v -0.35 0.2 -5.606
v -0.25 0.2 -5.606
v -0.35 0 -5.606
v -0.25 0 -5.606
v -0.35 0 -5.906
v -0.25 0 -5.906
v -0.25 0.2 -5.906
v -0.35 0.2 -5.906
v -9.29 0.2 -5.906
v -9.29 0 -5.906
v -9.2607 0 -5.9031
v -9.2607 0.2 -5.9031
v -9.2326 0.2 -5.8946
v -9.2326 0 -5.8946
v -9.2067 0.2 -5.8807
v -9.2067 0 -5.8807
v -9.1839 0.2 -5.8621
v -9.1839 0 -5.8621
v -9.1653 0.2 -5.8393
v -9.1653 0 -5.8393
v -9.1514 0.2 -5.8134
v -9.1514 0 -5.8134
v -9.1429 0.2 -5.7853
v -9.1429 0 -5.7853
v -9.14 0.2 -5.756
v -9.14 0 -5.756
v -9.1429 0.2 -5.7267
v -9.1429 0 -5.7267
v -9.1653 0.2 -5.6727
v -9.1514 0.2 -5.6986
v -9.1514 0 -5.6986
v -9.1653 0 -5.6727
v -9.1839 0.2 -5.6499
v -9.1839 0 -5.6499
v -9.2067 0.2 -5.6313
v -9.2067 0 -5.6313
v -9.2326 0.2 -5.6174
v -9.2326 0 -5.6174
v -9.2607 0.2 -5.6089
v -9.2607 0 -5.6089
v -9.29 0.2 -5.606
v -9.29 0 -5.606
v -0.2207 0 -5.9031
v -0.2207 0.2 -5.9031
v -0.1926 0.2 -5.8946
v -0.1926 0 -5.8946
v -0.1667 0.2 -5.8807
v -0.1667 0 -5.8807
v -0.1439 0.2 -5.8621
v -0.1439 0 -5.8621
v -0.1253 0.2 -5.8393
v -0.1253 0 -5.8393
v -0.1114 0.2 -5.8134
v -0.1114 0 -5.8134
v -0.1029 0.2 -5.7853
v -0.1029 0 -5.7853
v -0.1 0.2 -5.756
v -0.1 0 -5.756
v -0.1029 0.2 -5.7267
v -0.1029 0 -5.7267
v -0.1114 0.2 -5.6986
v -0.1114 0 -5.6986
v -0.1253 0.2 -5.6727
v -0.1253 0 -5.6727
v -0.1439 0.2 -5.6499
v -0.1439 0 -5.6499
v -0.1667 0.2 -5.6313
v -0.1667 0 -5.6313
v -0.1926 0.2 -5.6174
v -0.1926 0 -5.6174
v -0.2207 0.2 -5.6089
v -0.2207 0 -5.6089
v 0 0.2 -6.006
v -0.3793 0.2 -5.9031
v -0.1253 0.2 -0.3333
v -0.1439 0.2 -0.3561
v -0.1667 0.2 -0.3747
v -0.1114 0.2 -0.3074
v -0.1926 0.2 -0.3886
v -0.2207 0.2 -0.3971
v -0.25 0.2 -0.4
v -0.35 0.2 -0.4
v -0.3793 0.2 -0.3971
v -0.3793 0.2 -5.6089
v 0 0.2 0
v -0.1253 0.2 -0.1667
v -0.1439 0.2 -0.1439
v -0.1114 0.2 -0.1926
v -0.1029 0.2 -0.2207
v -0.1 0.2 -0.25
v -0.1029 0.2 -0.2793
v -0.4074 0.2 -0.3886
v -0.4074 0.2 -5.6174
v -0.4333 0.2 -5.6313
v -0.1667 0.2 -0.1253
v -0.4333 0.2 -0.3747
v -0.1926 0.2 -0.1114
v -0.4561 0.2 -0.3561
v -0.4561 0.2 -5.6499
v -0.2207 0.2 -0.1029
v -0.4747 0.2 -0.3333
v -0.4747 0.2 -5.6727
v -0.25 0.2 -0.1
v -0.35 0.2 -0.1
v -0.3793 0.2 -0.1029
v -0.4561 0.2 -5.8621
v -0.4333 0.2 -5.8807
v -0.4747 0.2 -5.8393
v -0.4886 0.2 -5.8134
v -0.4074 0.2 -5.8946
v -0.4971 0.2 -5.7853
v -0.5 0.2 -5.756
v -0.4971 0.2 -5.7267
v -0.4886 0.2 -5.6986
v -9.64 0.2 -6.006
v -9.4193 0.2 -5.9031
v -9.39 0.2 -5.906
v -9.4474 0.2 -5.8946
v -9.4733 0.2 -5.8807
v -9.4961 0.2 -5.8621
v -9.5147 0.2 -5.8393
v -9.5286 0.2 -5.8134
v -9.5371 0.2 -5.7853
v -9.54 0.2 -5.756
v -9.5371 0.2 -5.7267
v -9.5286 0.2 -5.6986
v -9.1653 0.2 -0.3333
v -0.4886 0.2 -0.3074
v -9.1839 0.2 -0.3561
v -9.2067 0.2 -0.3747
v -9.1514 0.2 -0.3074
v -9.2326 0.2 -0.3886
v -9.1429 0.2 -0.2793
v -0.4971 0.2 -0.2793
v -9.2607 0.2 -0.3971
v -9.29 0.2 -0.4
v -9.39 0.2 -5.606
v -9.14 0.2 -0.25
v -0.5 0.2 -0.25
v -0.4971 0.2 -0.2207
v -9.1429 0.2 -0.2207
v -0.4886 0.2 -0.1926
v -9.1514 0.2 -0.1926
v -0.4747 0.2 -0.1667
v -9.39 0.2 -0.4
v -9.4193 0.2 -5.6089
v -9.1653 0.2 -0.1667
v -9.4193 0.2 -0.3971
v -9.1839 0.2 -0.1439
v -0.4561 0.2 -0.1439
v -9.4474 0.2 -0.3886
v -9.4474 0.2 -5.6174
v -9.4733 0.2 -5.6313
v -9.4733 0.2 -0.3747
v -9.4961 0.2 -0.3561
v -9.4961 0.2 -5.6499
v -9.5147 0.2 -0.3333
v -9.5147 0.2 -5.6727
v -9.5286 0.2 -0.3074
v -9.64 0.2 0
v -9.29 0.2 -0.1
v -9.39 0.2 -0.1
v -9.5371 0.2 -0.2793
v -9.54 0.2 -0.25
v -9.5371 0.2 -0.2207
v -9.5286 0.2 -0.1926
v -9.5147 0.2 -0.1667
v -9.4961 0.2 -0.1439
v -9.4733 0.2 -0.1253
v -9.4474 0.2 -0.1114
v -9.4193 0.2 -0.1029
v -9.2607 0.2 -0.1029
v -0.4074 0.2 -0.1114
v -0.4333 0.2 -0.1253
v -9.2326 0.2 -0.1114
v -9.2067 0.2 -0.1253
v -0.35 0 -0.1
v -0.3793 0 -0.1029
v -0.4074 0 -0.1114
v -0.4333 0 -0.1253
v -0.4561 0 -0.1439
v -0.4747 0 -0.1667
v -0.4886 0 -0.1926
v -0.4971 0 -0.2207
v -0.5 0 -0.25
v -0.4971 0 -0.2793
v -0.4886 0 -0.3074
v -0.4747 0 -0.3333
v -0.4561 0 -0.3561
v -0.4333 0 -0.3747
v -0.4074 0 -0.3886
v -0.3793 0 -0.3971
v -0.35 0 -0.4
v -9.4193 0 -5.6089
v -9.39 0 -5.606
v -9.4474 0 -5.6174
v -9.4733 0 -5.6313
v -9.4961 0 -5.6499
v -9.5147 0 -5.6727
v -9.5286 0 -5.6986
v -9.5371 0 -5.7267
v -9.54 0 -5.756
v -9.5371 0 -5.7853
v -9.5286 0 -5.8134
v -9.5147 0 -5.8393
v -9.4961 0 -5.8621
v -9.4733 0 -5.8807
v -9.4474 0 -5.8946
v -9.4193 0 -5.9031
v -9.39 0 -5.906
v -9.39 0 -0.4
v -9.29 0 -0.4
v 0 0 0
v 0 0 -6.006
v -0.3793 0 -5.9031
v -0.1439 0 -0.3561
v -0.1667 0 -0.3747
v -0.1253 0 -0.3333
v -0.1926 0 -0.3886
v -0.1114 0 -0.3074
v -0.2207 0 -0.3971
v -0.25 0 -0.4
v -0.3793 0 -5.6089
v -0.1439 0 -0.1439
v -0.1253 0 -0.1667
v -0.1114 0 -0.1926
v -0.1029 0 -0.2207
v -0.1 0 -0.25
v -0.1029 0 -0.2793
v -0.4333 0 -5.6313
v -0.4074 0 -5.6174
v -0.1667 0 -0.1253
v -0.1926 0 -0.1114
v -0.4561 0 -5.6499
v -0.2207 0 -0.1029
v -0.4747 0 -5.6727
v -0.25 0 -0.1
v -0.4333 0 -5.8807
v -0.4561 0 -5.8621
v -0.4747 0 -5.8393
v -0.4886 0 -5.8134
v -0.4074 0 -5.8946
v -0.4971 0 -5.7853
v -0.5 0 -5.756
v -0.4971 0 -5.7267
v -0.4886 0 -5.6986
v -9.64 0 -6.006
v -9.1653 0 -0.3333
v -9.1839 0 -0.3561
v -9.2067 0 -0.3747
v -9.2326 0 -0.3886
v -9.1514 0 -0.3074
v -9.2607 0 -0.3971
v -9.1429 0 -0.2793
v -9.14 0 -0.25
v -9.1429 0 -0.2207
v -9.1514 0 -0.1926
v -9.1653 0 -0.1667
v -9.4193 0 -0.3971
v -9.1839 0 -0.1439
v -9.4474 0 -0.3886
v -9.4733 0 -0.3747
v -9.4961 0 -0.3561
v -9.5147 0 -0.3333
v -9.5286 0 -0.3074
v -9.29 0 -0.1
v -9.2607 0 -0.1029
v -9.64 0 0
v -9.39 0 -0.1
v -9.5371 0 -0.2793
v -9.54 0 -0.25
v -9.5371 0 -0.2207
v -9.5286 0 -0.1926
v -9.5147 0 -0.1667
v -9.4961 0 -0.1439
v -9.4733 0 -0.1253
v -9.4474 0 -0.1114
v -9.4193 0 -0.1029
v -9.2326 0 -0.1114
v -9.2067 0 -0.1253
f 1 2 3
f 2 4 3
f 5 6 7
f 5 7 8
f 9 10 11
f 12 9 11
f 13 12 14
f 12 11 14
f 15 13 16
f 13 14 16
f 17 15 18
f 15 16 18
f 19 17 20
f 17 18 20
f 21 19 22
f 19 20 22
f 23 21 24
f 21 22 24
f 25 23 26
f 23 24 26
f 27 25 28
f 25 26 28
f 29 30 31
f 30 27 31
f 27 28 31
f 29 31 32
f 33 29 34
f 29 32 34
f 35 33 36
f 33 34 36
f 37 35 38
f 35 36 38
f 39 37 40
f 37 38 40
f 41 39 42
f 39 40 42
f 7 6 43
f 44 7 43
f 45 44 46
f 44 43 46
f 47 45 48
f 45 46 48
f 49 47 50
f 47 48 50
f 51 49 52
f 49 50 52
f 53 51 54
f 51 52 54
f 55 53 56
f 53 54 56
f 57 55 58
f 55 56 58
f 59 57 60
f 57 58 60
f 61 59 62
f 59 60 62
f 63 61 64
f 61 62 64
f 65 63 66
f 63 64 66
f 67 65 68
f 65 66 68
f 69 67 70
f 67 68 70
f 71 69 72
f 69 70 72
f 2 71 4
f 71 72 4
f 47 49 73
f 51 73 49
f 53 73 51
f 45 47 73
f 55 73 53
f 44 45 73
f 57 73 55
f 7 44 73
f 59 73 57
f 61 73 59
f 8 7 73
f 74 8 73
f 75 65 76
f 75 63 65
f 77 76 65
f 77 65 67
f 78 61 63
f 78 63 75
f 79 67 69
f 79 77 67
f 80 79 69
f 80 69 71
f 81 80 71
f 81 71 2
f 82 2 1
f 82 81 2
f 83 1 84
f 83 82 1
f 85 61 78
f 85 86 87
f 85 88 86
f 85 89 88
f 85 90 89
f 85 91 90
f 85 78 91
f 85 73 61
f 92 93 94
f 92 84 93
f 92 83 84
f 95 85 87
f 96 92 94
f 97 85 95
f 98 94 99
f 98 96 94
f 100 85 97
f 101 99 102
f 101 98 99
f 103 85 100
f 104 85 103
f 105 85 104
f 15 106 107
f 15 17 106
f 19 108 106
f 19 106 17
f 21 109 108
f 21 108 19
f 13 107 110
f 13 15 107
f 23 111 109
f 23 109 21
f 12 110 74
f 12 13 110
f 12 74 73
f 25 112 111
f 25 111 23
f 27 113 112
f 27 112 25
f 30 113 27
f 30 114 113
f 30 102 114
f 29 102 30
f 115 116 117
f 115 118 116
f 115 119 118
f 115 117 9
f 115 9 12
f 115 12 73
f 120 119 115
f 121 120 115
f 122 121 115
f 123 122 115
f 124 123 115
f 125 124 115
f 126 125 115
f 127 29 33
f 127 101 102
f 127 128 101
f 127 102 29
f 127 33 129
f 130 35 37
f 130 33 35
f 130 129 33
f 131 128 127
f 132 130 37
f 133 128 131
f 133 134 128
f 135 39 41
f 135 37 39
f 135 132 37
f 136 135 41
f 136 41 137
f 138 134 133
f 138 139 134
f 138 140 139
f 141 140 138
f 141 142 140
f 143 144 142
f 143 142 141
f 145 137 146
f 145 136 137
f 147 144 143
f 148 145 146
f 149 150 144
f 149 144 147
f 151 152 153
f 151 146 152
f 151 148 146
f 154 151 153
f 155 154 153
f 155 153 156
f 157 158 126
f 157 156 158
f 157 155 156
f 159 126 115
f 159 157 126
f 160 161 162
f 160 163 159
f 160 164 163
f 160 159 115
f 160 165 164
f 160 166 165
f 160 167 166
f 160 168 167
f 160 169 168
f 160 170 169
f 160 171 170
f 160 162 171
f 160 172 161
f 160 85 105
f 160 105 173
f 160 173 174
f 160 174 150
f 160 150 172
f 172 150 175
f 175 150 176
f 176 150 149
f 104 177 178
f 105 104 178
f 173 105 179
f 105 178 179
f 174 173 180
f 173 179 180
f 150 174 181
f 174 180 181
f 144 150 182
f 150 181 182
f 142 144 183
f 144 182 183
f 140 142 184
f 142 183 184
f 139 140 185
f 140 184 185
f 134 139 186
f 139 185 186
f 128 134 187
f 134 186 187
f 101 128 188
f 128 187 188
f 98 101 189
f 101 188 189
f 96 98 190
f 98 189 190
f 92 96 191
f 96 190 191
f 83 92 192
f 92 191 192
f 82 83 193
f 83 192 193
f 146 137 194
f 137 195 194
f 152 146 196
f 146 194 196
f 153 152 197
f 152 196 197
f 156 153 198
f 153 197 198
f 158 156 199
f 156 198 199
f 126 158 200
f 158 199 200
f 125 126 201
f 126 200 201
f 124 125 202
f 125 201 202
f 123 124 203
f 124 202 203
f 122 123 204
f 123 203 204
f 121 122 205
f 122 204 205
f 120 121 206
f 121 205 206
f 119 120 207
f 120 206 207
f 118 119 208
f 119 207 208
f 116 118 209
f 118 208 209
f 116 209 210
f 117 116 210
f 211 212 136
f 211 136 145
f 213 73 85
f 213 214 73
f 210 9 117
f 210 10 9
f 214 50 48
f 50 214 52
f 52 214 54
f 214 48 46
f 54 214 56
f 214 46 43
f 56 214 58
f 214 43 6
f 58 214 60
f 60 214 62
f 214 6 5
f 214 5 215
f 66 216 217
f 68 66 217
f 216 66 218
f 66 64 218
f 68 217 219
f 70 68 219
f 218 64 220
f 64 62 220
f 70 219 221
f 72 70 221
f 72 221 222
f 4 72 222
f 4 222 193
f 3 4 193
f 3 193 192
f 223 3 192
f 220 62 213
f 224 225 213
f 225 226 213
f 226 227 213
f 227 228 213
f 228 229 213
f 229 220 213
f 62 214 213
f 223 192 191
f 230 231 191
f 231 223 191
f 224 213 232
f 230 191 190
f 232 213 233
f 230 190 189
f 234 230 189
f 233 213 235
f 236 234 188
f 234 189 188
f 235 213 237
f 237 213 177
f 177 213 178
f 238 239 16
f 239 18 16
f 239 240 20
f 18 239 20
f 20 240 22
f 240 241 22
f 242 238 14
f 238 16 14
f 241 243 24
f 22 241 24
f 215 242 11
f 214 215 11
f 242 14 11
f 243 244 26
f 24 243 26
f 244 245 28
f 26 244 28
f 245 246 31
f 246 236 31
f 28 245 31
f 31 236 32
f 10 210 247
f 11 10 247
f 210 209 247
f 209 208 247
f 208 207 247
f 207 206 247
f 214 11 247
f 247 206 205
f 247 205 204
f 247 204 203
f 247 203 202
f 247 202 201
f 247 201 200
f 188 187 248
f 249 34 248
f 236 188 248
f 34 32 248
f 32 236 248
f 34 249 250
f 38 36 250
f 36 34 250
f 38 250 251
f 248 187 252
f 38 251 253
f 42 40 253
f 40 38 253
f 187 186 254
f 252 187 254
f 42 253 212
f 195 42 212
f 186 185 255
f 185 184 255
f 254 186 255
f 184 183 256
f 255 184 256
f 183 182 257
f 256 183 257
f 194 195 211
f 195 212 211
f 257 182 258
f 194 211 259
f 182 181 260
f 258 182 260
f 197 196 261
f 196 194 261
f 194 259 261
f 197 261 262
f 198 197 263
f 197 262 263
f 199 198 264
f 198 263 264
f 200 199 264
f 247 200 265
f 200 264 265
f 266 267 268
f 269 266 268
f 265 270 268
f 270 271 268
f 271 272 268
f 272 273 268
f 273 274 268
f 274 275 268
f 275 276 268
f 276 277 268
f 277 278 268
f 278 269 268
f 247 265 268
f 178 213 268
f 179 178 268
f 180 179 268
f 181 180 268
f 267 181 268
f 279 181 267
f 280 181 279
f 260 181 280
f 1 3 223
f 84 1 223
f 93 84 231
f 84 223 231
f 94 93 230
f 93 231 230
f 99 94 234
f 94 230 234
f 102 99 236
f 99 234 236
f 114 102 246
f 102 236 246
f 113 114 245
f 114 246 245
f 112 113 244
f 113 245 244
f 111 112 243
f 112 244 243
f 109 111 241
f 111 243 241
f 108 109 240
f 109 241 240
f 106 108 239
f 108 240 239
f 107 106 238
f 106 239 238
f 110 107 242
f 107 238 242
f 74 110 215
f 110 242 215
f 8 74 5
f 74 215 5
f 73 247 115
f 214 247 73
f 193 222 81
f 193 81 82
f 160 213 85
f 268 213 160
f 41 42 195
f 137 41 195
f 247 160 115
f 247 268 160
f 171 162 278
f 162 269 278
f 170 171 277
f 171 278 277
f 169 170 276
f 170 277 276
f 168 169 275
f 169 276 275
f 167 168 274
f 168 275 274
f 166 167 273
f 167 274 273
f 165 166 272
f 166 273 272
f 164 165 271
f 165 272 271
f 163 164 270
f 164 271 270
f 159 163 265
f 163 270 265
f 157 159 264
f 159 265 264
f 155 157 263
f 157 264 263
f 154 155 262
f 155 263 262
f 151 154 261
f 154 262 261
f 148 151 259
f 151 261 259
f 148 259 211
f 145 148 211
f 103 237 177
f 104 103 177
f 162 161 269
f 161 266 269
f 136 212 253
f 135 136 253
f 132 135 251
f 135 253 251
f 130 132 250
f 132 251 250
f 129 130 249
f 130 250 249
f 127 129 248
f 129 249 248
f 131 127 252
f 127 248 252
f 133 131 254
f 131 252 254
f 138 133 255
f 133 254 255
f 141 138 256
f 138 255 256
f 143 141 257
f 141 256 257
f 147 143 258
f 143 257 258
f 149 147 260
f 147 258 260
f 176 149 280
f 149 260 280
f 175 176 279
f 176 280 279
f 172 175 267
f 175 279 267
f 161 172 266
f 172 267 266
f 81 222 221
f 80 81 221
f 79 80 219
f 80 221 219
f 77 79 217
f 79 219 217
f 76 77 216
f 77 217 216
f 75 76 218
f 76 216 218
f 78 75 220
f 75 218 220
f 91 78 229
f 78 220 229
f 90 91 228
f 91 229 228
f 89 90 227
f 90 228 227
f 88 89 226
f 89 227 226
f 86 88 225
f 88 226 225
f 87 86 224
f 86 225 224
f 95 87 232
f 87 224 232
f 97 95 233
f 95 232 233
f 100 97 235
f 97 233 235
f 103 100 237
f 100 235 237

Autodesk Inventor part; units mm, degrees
ref_plane "YZ Plane" through (0, 0, 0) normal (1, 0, 0) x (0, 1, 0)
ref_plane "XZ Plane" through (0, 0, 0) normal (0, 1, 0) x (-1, 0, 0)
sketch "Boceto6" plane through (0, 0, 0) normal (0, 1, 0) x (-1, 0, 0)
  line L0 (0, 0) -> (9.64, 0)
  line L1 (9.64, 0) -> (9.64, -6.006)
  line L2 (9.64, -6.006) -> (0, -6.006)
  line L3 (0, -6.006) -> (0, 0)
  arc A0 (0.25, -0.1) -> (0.25, -0.4) centre (0.25, -0.25) ccw
  arc A1 (0.35, -0.4) -> (0.35, -0.1) centre (0.35, -0.25) ccw
  line L4 (0.25, -0.4) -> (0.35, -0.4)
  line L5 (0.25, -0.1) -> (0.35, -0.1)
  arc A2 (9.29, -0.1) -> (9.29, -0.4) centre (9.29, -0.25) ccw
  arc A3 (9.39, -0.4) -> (9.39, -0.1) centre (9.39, -0.25) ccw
  line L6 (9.29, -0.4) -> (9.39, -0.4)
  line L7 (9.29, -0.1) -> (9.39, -0.1)
  arc A4 (0.25, -5.906) -> (0.25, -5.906) centre (0.25, -5.946) ccw
  arc A5 (0.35, -5.906) -> (0.35, -5.906) centre (0.2, -5.906) ccw
  line L8 (0.25, -5.906) -> (0.35, -5.906)
  line L9 (0.25, -5.906) -> (0.35, -5.906)
  arc A6 (9.29, -5.906) -> (9.29, -5.906) centre (9.29, -5.756) ccw
  arc A7 (9.39, -5.906) -> (9.39, -5.906) centre (9.39, -5.946) ccw
  line L10 (9.29, -5.906) -> (9.39, -5.906)
  line L11 (9.29, -5.906) -> (9.39, -5.906)
  arc A8 (0.25, -5.606) -> (0.25, -5.906) centre (0.25, -5.756) ccw
  arc A9 (0.35, -5.906) -> (0.35, -5.606) centre (0.35, -5.756) ccw
  line L12 (0.25, -5.906) -> (0.35, -5.906)
  line L13 (0.25, -5.606) -> (0.35, -5.606)
  arc A10 (9.29, -5.606) -> (9.29, -5.906) centre (9.29, -5.756) ccw
  arc A11 (9.39, -5.906) -> (9.39, -5.606) centre (9.39, -5.756) ccw
  line L14 (9.29, -5.906) -> (9.39, -5.906)
  line L15 (9.29, -5.606) -> (9.39, -5.606)
  dimension "d33" = 9.64
  dimension "d34" = 0.25
  dimension "d35" = 0.1
  dimension "d36" = 0.25
  dimension "d37" = 0.25
  dimension "d41" = 6.006
  dimension "d42" = 0.1
  dimension "d43" = 0.1
  dimension "d44" = 0.1
  dimension "d45" = 0.1
extrude "Extrusión4" add sketch "Boceto6" along normal blind 0.2 contours L0 L1 L2 A5 A9 L13 A8 L3 | A4 | A5 A8 L8 L2 | A7
sketch "Boceto7" plane through (0, 0.2, 0) normal (0, 1, 0) x (1, 0, 0)
  line L0 (-9.29, 0.1) -> (-9.39, 0.1) projected
  arc A0 (-9.39, 0.4) -> (-9.39, 0.1) centre (-9.39, 0.25) ccw projected
  line L1 (-9.39, 0.4) -> (-9.29, 0.4) projected
  arc A1 (-9.29, 0.1) -> (-9.29, 0.4) centre (-9.29, 0.25) ccw projected
  line L2 (-0.25, 0.1) -> (-0.35, 0.1) projected
  arc A2 (-0.35, 0.4) -> (-0.35, 0.1) centre (-0.35, 0.25) ccw projected
  line L3 (-0.35, 0.4) -> (-0.25, 0.4) projected
  arc A3 (-0.25, 0.1) -> (-0.25, 0.4) centre (-0.25, 0.25) ccw projected
  line L4 (-9.64, 0) -> (0, 0) projected
  line L5 (0, 0) -> (0, 6.006) projected
  line L6 (0, 6.006) -> (-9.64, 6.006) projected
  line L7 (-9.64, 6.006) -> (-9.64, 0) projected
  line L8 (-9.64, 6.006) -> (0, 6.006) projected
  line L9 (0, 0) -> (0, 6.006) projected
  line L10 (-0.8, 5.546) -> (-0.8, 0.65)
  line L11 (-0.8, 0.65) -> (-8.74, 0.65)
  line L12 (-8.74, 0.65) -> (-8.74, 5.546)
  line L13 (-8.74, 5.546) -> (-0.8, 5.546)
  dimension "d39" = 7.94
  dimension "d40" = 0.8
extrude "Extrusión5" cut sketch "Boceto7" along normal blind 0.4 contours L10 L11 L12 L13
ref_plane "Plano de trabajo2" through (0, 2.3, 0) normal (0, 1, 0) x (1, 0, 0)
sketch "Boceto9" plane through (0, 2.3, 0) normal (0, 1, 0) x (1, 0, 0)
  line L0 (-8.9922, 5.6013) -> (-0.8, 5.6013) construction
  line L1 (-0.8, 5.6013) -> (-0.8, 0.65) construction
  line L2 (-0.8, 0.65) -> (-8.9922, 0.65) construction
  line L3 (-8.9922, 0.65) -> (-8.9922, 5.6013) construction
  line L4 (-0.8, 5.546) -> (-8.74, 5.546) projected
  line L5 (-8.74, 5.546) -> (-8.74, 0.65) projected
  line L6 (-8.74, 0.65) -> (-0.8, 0.65) projected
  line L7 (-0.8, 0.65) -> (-0.8, 5.546) projected
  point P0 (0, 0)
decal "Calcomanía1"
properties part number "screen"
